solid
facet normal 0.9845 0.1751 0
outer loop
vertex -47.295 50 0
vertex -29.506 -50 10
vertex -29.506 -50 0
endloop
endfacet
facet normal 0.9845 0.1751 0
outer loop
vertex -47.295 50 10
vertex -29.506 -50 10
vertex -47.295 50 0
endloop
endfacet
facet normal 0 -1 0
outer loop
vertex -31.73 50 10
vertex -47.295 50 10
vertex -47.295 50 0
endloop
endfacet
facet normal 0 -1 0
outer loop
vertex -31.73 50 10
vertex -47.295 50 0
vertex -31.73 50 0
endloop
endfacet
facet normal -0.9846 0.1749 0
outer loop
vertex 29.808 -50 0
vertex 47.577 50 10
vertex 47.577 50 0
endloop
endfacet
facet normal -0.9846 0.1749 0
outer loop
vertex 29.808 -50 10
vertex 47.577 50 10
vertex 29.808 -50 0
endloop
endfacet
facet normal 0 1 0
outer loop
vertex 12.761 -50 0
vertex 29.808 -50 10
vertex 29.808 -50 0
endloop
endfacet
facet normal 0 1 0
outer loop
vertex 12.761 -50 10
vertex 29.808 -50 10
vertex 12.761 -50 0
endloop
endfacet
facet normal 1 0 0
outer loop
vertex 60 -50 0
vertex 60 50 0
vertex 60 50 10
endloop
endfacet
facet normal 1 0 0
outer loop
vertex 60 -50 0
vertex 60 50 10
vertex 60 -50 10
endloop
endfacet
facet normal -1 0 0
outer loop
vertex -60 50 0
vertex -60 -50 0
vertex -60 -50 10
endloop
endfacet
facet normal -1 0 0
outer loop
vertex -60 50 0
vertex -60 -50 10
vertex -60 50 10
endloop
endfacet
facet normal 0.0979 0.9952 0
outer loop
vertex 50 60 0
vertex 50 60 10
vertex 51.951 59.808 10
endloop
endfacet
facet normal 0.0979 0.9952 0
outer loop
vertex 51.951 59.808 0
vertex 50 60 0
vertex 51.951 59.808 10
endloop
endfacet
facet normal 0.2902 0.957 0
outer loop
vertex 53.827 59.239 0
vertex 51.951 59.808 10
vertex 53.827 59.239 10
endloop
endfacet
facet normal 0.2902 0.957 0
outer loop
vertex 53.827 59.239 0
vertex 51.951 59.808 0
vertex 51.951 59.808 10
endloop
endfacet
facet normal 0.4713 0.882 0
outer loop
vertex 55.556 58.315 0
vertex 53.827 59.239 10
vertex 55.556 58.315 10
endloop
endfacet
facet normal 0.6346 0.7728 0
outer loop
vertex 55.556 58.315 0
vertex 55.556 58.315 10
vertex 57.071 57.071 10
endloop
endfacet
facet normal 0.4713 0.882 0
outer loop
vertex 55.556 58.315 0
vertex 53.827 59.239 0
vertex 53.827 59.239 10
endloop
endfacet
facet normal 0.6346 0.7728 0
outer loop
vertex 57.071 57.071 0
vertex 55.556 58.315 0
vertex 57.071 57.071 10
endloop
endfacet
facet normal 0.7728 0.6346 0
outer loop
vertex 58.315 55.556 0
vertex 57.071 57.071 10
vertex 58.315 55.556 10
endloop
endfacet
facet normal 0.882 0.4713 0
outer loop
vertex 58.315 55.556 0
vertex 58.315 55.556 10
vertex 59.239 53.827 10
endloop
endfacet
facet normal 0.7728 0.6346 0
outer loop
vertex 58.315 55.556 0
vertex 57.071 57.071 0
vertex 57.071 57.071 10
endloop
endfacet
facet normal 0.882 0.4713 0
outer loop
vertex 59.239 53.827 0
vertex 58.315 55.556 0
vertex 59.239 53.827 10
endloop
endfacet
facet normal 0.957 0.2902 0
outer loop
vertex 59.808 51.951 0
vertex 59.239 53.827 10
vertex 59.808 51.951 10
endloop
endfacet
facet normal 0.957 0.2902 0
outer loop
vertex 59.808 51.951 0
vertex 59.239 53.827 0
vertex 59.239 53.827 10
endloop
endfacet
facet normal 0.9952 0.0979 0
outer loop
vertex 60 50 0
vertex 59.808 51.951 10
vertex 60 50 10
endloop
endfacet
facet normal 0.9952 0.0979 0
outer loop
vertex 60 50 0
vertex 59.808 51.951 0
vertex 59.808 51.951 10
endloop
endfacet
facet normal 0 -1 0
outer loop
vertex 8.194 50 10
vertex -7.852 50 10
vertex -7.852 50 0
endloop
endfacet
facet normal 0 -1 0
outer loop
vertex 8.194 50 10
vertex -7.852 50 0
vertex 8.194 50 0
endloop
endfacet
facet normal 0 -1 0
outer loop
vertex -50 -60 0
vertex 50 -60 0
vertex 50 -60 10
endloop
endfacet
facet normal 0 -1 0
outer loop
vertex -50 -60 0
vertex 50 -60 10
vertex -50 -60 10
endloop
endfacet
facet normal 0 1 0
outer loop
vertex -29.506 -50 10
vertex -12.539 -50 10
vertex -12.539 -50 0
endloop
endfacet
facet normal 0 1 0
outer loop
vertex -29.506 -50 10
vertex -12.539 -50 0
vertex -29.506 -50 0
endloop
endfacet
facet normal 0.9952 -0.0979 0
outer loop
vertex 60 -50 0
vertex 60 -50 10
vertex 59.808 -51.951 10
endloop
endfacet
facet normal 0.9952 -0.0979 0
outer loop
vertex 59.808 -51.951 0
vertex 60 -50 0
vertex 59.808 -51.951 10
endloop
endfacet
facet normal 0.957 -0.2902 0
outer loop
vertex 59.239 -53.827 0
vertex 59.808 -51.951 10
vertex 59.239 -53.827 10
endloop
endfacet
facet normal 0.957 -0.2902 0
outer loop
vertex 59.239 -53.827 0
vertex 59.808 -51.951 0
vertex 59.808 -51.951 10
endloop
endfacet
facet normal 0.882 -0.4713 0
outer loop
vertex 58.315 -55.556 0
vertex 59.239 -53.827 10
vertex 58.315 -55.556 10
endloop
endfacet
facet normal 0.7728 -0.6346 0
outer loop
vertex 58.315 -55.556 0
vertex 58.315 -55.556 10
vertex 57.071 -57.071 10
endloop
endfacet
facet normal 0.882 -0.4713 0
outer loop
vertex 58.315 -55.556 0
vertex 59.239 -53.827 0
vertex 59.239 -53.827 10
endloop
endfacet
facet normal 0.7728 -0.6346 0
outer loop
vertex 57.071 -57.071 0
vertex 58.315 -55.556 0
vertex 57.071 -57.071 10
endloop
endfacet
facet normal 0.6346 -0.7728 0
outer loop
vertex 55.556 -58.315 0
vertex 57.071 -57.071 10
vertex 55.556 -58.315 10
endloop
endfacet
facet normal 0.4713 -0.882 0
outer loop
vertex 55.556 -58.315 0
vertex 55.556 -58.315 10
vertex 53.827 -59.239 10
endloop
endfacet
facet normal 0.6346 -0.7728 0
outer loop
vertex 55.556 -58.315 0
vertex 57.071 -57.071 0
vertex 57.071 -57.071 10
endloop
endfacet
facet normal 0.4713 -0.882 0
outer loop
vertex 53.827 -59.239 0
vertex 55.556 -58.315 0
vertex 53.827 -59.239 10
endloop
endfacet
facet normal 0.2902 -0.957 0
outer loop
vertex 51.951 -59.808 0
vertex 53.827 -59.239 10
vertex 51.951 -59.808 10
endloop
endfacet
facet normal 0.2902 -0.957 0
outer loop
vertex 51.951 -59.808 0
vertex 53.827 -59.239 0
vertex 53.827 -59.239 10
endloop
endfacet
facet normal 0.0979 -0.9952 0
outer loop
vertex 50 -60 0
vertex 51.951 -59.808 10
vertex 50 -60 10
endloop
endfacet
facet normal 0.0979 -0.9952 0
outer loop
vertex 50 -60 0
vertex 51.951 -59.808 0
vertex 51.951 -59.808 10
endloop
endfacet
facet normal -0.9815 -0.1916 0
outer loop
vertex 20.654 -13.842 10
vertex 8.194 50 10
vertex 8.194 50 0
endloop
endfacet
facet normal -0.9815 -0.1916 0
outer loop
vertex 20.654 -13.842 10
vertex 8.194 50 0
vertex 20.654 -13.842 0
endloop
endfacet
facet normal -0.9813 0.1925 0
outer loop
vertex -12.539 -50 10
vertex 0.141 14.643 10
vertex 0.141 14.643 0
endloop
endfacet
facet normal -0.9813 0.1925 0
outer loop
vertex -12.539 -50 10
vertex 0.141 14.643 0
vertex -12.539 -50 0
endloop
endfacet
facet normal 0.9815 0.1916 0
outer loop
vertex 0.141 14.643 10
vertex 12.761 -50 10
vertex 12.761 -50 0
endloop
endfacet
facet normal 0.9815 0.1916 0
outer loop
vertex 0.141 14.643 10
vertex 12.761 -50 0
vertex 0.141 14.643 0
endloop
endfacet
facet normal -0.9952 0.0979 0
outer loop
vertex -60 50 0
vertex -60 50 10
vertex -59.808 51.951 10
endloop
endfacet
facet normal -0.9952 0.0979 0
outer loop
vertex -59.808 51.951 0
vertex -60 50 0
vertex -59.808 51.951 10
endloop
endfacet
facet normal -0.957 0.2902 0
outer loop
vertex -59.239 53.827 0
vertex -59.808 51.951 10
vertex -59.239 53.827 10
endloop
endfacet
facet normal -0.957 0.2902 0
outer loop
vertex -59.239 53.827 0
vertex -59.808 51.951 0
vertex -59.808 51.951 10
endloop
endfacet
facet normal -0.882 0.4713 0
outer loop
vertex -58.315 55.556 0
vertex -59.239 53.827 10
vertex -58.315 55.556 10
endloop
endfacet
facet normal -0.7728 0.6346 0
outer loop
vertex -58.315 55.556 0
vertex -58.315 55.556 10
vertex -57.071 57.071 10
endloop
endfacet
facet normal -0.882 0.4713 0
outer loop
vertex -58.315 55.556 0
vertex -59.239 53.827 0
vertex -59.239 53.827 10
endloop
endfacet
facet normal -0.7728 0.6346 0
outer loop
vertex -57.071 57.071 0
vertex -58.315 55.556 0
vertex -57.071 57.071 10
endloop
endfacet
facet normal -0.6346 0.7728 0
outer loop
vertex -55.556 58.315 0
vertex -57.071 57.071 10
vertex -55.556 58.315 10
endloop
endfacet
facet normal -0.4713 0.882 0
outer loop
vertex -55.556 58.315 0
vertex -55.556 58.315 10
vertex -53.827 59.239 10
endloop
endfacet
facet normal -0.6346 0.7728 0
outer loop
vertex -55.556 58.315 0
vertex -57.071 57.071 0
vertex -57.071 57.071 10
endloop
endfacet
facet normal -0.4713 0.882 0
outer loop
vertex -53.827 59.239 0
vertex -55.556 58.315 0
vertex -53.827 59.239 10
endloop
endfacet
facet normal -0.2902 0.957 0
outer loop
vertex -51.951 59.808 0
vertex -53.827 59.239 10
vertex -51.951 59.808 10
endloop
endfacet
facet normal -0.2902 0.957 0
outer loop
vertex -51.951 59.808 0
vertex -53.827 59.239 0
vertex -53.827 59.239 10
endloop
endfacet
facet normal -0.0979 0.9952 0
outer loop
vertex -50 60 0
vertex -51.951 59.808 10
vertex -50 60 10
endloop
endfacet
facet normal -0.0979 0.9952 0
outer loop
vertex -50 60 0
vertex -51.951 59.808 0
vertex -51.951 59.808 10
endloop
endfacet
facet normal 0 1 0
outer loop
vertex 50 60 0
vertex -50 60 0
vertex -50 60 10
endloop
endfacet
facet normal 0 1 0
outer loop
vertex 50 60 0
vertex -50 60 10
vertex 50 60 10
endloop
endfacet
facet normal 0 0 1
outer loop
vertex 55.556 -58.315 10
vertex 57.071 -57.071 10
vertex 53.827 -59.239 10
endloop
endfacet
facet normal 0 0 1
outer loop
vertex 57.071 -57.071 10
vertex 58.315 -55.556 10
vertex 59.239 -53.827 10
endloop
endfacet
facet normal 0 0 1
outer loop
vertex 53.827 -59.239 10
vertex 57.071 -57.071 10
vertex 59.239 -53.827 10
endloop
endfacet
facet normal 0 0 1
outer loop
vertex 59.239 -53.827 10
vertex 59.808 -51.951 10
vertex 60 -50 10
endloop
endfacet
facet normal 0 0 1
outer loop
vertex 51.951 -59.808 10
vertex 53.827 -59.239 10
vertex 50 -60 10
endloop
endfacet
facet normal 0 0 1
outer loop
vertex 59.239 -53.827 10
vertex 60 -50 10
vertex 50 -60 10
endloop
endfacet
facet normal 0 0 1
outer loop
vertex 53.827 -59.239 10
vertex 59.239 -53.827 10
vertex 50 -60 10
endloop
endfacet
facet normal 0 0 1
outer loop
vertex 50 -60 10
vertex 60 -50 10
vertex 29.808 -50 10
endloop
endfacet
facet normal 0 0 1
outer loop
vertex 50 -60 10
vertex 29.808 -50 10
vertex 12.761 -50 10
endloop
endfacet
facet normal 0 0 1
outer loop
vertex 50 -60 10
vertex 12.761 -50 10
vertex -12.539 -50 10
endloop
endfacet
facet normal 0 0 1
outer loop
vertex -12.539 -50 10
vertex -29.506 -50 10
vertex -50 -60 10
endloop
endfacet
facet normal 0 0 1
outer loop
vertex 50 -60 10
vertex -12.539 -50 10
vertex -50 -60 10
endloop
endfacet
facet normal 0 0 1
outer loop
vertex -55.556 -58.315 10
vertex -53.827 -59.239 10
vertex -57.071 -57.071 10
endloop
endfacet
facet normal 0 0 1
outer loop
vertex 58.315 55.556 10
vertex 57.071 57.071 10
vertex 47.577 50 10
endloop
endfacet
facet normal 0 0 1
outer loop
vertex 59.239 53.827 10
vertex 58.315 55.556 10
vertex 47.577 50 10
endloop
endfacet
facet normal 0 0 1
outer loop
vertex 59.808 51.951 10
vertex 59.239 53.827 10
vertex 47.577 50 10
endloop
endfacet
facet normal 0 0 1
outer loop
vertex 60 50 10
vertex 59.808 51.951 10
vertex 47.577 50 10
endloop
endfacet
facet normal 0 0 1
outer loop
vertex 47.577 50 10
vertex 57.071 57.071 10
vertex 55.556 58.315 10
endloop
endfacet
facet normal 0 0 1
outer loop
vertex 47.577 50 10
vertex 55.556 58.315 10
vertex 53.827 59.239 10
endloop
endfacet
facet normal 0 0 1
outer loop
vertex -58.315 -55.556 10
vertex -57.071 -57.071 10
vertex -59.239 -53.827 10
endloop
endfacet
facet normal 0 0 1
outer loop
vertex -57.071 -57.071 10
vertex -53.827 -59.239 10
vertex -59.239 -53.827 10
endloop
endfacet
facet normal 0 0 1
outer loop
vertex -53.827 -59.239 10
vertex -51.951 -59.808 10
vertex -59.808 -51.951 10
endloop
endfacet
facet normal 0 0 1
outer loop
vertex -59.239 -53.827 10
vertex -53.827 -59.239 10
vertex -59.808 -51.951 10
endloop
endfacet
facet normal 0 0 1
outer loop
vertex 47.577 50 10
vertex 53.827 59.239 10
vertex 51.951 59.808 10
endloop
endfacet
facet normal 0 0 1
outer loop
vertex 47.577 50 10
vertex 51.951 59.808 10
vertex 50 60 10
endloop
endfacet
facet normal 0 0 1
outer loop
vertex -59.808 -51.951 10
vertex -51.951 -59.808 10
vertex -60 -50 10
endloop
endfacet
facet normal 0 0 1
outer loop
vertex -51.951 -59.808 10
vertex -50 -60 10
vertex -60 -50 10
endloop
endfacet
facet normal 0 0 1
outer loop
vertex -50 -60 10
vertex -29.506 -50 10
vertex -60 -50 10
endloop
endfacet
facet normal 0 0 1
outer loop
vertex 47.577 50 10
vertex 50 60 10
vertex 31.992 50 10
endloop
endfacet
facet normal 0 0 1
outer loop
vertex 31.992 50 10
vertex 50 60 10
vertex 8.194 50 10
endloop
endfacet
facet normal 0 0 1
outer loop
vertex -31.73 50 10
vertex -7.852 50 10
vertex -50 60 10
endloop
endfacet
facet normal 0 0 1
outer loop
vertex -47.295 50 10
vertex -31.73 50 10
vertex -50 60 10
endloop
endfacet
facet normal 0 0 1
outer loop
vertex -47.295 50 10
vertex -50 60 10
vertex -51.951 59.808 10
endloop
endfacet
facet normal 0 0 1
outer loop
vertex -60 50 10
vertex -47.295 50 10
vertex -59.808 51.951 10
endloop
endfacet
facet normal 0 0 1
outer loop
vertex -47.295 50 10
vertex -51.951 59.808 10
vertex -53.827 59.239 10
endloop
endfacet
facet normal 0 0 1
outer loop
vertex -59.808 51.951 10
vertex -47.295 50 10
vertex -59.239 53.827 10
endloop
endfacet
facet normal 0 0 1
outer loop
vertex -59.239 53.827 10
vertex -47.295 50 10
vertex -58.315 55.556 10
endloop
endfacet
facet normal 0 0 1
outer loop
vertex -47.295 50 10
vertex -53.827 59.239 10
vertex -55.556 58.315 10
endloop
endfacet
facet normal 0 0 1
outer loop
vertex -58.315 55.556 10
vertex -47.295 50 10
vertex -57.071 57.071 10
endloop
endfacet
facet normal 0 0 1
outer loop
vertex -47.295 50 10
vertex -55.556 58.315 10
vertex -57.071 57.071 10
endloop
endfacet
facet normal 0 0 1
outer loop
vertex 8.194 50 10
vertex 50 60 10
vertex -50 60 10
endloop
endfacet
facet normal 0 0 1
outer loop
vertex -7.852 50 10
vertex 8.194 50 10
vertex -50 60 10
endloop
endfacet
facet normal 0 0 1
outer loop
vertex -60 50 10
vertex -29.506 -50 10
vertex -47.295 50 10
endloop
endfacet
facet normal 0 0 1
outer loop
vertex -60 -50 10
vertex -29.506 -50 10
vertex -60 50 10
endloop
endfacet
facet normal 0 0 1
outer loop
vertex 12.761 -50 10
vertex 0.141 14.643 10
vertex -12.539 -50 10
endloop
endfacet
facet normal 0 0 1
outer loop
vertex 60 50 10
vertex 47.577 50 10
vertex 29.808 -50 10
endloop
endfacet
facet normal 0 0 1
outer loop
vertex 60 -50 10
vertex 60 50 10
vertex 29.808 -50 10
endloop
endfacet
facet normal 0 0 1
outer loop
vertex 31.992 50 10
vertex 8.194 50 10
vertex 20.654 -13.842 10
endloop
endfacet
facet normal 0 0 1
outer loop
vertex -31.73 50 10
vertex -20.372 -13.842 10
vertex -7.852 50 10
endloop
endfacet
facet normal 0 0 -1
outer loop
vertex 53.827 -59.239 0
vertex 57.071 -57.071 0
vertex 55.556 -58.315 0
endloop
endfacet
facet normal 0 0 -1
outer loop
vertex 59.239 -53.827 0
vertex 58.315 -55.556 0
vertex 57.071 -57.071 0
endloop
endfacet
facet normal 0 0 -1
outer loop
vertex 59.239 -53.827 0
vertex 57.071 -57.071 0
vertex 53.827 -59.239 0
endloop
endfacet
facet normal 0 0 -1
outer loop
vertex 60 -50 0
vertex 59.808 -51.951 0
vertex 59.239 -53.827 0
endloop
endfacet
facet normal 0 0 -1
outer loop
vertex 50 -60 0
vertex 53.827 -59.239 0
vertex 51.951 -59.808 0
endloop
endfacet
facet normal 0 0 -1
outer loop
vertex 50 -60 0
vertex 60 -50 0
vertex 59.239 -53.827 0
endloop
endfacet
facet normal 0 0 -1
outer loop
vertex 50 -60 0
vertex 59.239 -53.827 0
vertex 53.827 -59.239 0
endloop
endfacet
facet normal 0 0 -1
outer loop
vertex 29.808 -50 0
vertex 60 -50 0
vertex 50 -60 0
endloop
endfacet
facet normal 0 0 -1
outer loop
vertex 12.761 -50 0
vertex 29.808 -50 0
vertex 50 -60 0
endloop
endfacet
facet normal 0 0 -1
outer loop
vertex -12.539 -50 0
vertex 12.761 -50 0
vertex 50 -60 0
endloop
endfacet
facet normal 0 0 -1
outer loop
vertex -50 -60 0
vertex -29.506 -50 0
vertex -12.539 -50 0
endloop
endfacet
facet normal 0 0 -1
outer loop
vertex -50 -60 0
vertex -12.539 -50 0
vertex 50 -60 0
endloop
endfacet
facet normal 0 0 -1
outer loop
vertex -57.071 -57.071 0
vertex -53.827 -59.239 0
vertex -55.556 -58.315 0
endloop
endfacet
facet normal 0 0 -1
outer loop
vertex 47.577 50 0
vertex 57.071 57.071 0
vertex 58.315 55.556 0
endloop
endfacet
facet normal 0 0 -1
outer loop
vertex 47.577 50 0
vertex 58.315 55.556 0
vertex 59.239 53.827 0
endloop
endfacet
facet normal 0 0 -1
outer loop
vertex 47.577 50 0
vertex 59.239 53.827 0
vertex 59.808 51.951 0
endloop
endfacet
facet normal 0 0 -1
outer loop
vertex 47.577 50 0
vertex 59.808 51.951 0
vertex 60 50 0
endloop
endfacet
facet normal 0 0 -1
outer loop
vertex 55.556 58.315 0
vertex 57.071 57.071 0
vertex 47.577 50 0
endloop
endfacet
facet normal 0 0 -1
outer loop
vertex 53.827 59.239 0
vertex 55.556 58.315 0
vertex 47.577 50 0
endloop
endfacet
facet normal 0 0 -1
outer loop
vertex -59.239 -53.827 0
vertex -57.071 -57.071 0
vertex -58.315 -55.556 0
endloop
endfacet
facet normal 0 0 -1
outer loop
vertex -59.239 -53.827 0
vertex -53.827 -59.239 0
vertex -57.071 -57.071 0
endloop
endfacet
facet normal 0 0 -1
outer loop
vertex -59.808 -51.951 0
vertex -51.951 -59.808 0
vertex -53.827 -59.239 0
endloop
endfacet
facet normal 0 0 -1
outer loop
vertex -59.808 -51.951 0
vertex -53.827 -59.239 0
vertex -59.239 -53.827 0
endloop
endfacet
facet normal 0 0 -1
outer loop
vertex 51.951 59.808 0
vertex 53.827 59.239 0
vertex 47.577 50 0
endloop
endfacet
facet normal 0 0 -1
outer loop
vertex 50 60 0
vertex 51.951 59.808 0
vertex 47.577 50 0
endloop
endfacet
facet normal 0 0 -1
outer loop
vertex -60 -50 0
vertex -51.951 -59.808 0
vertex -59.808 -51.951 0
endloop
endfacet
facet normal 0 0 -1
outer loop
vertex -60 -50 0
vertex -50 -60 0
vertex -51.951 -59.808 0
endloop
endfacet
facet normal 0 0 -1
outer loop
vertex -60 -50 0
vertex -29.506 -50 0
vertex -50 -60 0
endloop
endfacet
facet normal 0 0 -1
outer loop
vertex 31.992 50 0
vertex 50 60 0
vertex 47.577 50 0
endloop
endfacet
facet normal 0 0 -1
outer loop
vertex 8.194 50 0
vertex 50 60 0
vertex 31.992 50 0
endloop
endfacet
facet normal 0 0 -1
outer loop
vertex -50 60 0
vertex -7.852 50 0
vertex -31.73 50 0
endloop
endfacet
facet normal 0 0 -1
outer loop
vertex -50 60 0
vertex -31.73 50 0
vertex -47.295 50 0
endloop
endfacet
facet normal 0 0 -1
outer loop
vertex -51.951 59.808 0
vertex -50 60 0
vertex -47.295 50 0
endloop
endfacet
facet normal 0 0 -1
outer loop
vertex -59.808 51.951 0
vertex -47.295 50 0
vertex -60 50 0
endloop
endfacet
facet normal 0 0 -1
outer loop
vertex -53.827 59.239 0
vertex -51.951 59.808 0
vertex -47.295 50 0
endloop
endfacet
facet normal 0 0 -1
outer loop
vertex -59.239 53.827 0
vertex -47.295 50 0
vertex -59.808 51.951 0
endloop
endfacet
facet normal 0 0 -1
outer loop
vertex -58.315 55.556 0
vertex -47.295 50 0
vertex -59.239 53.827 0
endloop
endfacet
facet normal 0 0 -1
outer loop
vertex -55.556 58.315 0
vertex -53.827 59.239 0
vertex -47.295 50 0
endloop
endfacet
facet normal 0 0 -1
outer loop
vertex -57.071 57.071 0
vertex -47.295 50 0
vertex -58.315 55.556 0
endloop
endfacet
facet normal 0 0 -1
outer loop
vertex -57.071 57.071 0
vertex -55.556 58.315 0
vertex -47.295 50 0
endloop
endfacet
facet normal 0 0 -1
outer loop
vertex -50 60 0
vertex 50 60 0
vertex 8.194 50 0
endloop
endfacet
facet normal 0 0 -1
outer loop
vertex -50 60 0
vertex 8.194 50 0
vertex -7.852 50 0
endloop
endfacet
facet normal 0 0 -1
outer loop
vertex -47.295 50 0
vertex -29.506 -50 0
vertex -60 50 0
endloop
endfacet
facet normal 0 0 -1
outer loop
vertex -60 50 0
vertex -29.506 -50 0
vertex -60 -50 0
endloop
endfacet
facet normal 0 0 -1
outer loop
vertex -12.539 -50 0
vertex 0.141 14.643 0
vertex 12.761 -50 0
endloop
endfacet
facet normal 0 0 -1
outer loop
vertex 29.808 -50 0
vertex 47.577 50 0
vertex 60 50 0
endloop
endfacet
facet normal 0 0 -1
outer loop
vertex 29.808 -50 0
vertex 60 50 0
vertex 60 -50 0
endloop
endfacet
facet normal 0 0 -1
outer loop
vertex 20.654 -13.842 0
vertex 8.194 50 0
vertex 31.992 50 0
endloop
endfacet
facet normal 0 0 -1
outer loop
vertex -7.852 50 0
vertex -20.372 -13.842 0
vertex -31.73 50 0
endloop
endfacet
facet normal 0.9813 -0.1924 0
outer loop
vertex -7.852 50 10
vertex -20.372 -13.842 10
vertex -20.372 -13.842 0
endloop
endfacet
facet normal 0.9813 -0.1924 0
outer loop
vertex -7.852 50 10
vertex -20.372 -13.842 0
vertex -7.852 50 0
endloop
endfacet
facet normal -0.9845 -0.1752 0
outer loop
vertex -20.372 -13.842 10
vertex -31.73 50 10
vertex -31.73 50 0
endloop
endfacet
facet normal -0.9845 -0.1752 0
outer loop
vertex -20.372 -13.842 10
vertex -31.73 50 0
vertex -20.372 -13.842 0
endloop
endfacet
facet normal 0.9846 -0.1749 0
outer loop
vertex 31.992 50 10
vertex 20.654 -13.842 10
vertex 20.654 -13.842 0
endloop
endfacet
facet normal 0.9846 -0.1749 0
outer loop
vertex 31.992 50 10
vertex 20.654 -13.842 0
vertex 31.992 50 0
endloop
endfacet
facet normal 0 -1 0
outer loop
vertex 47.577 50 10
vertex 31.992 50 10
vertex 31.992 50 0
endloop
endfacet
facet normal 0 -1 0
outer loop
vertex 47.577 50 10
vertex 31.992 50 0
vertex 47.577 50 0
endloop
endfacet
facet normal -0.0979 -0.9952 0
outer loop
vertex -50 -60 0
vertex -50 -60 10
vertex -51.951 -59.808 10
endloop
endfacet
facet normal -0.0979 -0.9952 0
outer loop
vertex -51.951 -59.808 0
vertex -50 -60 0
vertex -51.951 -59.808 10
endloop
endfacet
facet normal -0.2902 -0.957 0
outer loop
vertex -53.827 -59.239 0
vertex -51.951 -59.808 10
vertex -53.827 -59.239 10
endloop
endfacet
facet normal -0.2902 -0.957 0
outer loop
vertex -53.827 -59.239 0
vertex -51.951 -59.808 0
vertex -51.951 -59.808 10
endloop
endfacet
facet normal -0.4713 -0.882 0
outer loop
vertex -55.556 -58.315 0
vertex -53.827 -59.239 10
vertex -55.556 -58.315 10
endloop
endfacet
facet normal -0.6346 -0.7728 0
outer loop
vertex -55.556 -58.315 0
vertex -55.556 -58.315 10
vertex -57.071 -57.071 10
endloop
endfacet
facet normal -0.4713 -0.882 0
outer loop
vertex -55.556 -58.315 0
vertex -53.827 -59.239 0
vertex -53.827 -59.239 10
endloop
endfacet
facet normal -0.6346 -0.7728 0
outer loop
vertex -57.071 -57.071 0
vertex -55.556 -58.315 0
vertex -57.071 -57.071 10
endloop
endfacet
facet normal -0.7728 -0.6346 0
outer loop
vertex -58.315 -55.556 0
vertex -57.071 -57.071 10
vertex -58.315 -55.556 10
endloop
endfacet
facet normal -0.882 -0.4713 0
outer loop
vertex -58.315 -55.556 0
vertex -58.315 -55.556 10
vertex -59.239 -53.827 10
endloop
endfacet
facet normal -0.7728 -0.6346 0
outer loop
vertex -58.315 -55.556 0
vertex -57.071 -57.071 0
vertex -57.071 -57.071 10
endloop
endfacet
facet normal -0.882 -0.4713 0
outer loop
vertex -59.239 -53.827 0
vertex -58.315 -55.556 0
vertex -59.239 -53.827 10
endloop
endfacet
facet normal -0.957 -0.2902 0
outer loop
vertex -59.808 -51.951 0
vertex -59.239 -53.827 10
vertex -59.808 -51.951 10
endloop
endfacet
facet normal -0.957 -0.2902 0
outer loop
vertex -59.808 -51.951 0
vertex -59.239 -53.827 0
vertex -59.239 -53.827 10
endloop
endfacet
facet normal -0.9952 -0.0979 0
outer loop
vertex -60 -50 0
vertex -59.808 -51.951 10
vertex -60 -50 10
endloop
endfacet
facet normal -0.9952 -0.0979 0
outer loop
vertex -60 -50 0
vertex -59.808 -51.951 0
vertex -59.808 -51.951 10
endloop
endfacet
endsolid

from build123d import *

# Parameters (mm, degrees)
BOSS_EXTRUDE1_DEPTH = 10
CUT_EXTRUDE36_DEPTH = 10


with BuildPart() as part:
    # Sketch1 → Boss-Extrude1 (new body)
    with BuildSketch(Plane.XY):
        with BuildLine():
            Line((-50, 60), (50, 60))
            ThreePointArc((50, 60), (57.071067812, 57.071067812), (60, 50))
            Line((60, 50), (60, -50))
            ThreePointArc((60, -50), (57.071067812, -57.071067812), (50, -60))
            Line((50, -60), (-50, -60))
            ThreePointArc((-50, -60), (-57.071067812, -57.071067812), (-60, -50))
            Line((-60, -50), (-60, 50))
            ThreePointArc((-60, 50), (-57.071067812, 57.071067812), (-50, 60))
        make_face()
    extrude(amount=BOSS_EXTRUDE1_DEPTH)

    # Sketch2 → Cut-Extrude36 (cut)
    with BuildSketch(Plane.XY.offset(10)):
        Polygon((-47.294871795, 50), (-31.729967949, 50), (-20.371794872, -13.842147436), (-7.851762821, 50), (8.193910256, 50), (20.653846154, -13.842147436), (31.991987179, 50), (47.576923077, 50), (29.80849359, -50), (12.761217949, -50), (0.141025641, 14.643429487), (-12.539262821, -50), (-29.506410256, -50), align=None)
    extrude(amount=-CUT_EXTRUDE36_DEPTH, mode=Mode.SUBTRACT)


solid = part.part
